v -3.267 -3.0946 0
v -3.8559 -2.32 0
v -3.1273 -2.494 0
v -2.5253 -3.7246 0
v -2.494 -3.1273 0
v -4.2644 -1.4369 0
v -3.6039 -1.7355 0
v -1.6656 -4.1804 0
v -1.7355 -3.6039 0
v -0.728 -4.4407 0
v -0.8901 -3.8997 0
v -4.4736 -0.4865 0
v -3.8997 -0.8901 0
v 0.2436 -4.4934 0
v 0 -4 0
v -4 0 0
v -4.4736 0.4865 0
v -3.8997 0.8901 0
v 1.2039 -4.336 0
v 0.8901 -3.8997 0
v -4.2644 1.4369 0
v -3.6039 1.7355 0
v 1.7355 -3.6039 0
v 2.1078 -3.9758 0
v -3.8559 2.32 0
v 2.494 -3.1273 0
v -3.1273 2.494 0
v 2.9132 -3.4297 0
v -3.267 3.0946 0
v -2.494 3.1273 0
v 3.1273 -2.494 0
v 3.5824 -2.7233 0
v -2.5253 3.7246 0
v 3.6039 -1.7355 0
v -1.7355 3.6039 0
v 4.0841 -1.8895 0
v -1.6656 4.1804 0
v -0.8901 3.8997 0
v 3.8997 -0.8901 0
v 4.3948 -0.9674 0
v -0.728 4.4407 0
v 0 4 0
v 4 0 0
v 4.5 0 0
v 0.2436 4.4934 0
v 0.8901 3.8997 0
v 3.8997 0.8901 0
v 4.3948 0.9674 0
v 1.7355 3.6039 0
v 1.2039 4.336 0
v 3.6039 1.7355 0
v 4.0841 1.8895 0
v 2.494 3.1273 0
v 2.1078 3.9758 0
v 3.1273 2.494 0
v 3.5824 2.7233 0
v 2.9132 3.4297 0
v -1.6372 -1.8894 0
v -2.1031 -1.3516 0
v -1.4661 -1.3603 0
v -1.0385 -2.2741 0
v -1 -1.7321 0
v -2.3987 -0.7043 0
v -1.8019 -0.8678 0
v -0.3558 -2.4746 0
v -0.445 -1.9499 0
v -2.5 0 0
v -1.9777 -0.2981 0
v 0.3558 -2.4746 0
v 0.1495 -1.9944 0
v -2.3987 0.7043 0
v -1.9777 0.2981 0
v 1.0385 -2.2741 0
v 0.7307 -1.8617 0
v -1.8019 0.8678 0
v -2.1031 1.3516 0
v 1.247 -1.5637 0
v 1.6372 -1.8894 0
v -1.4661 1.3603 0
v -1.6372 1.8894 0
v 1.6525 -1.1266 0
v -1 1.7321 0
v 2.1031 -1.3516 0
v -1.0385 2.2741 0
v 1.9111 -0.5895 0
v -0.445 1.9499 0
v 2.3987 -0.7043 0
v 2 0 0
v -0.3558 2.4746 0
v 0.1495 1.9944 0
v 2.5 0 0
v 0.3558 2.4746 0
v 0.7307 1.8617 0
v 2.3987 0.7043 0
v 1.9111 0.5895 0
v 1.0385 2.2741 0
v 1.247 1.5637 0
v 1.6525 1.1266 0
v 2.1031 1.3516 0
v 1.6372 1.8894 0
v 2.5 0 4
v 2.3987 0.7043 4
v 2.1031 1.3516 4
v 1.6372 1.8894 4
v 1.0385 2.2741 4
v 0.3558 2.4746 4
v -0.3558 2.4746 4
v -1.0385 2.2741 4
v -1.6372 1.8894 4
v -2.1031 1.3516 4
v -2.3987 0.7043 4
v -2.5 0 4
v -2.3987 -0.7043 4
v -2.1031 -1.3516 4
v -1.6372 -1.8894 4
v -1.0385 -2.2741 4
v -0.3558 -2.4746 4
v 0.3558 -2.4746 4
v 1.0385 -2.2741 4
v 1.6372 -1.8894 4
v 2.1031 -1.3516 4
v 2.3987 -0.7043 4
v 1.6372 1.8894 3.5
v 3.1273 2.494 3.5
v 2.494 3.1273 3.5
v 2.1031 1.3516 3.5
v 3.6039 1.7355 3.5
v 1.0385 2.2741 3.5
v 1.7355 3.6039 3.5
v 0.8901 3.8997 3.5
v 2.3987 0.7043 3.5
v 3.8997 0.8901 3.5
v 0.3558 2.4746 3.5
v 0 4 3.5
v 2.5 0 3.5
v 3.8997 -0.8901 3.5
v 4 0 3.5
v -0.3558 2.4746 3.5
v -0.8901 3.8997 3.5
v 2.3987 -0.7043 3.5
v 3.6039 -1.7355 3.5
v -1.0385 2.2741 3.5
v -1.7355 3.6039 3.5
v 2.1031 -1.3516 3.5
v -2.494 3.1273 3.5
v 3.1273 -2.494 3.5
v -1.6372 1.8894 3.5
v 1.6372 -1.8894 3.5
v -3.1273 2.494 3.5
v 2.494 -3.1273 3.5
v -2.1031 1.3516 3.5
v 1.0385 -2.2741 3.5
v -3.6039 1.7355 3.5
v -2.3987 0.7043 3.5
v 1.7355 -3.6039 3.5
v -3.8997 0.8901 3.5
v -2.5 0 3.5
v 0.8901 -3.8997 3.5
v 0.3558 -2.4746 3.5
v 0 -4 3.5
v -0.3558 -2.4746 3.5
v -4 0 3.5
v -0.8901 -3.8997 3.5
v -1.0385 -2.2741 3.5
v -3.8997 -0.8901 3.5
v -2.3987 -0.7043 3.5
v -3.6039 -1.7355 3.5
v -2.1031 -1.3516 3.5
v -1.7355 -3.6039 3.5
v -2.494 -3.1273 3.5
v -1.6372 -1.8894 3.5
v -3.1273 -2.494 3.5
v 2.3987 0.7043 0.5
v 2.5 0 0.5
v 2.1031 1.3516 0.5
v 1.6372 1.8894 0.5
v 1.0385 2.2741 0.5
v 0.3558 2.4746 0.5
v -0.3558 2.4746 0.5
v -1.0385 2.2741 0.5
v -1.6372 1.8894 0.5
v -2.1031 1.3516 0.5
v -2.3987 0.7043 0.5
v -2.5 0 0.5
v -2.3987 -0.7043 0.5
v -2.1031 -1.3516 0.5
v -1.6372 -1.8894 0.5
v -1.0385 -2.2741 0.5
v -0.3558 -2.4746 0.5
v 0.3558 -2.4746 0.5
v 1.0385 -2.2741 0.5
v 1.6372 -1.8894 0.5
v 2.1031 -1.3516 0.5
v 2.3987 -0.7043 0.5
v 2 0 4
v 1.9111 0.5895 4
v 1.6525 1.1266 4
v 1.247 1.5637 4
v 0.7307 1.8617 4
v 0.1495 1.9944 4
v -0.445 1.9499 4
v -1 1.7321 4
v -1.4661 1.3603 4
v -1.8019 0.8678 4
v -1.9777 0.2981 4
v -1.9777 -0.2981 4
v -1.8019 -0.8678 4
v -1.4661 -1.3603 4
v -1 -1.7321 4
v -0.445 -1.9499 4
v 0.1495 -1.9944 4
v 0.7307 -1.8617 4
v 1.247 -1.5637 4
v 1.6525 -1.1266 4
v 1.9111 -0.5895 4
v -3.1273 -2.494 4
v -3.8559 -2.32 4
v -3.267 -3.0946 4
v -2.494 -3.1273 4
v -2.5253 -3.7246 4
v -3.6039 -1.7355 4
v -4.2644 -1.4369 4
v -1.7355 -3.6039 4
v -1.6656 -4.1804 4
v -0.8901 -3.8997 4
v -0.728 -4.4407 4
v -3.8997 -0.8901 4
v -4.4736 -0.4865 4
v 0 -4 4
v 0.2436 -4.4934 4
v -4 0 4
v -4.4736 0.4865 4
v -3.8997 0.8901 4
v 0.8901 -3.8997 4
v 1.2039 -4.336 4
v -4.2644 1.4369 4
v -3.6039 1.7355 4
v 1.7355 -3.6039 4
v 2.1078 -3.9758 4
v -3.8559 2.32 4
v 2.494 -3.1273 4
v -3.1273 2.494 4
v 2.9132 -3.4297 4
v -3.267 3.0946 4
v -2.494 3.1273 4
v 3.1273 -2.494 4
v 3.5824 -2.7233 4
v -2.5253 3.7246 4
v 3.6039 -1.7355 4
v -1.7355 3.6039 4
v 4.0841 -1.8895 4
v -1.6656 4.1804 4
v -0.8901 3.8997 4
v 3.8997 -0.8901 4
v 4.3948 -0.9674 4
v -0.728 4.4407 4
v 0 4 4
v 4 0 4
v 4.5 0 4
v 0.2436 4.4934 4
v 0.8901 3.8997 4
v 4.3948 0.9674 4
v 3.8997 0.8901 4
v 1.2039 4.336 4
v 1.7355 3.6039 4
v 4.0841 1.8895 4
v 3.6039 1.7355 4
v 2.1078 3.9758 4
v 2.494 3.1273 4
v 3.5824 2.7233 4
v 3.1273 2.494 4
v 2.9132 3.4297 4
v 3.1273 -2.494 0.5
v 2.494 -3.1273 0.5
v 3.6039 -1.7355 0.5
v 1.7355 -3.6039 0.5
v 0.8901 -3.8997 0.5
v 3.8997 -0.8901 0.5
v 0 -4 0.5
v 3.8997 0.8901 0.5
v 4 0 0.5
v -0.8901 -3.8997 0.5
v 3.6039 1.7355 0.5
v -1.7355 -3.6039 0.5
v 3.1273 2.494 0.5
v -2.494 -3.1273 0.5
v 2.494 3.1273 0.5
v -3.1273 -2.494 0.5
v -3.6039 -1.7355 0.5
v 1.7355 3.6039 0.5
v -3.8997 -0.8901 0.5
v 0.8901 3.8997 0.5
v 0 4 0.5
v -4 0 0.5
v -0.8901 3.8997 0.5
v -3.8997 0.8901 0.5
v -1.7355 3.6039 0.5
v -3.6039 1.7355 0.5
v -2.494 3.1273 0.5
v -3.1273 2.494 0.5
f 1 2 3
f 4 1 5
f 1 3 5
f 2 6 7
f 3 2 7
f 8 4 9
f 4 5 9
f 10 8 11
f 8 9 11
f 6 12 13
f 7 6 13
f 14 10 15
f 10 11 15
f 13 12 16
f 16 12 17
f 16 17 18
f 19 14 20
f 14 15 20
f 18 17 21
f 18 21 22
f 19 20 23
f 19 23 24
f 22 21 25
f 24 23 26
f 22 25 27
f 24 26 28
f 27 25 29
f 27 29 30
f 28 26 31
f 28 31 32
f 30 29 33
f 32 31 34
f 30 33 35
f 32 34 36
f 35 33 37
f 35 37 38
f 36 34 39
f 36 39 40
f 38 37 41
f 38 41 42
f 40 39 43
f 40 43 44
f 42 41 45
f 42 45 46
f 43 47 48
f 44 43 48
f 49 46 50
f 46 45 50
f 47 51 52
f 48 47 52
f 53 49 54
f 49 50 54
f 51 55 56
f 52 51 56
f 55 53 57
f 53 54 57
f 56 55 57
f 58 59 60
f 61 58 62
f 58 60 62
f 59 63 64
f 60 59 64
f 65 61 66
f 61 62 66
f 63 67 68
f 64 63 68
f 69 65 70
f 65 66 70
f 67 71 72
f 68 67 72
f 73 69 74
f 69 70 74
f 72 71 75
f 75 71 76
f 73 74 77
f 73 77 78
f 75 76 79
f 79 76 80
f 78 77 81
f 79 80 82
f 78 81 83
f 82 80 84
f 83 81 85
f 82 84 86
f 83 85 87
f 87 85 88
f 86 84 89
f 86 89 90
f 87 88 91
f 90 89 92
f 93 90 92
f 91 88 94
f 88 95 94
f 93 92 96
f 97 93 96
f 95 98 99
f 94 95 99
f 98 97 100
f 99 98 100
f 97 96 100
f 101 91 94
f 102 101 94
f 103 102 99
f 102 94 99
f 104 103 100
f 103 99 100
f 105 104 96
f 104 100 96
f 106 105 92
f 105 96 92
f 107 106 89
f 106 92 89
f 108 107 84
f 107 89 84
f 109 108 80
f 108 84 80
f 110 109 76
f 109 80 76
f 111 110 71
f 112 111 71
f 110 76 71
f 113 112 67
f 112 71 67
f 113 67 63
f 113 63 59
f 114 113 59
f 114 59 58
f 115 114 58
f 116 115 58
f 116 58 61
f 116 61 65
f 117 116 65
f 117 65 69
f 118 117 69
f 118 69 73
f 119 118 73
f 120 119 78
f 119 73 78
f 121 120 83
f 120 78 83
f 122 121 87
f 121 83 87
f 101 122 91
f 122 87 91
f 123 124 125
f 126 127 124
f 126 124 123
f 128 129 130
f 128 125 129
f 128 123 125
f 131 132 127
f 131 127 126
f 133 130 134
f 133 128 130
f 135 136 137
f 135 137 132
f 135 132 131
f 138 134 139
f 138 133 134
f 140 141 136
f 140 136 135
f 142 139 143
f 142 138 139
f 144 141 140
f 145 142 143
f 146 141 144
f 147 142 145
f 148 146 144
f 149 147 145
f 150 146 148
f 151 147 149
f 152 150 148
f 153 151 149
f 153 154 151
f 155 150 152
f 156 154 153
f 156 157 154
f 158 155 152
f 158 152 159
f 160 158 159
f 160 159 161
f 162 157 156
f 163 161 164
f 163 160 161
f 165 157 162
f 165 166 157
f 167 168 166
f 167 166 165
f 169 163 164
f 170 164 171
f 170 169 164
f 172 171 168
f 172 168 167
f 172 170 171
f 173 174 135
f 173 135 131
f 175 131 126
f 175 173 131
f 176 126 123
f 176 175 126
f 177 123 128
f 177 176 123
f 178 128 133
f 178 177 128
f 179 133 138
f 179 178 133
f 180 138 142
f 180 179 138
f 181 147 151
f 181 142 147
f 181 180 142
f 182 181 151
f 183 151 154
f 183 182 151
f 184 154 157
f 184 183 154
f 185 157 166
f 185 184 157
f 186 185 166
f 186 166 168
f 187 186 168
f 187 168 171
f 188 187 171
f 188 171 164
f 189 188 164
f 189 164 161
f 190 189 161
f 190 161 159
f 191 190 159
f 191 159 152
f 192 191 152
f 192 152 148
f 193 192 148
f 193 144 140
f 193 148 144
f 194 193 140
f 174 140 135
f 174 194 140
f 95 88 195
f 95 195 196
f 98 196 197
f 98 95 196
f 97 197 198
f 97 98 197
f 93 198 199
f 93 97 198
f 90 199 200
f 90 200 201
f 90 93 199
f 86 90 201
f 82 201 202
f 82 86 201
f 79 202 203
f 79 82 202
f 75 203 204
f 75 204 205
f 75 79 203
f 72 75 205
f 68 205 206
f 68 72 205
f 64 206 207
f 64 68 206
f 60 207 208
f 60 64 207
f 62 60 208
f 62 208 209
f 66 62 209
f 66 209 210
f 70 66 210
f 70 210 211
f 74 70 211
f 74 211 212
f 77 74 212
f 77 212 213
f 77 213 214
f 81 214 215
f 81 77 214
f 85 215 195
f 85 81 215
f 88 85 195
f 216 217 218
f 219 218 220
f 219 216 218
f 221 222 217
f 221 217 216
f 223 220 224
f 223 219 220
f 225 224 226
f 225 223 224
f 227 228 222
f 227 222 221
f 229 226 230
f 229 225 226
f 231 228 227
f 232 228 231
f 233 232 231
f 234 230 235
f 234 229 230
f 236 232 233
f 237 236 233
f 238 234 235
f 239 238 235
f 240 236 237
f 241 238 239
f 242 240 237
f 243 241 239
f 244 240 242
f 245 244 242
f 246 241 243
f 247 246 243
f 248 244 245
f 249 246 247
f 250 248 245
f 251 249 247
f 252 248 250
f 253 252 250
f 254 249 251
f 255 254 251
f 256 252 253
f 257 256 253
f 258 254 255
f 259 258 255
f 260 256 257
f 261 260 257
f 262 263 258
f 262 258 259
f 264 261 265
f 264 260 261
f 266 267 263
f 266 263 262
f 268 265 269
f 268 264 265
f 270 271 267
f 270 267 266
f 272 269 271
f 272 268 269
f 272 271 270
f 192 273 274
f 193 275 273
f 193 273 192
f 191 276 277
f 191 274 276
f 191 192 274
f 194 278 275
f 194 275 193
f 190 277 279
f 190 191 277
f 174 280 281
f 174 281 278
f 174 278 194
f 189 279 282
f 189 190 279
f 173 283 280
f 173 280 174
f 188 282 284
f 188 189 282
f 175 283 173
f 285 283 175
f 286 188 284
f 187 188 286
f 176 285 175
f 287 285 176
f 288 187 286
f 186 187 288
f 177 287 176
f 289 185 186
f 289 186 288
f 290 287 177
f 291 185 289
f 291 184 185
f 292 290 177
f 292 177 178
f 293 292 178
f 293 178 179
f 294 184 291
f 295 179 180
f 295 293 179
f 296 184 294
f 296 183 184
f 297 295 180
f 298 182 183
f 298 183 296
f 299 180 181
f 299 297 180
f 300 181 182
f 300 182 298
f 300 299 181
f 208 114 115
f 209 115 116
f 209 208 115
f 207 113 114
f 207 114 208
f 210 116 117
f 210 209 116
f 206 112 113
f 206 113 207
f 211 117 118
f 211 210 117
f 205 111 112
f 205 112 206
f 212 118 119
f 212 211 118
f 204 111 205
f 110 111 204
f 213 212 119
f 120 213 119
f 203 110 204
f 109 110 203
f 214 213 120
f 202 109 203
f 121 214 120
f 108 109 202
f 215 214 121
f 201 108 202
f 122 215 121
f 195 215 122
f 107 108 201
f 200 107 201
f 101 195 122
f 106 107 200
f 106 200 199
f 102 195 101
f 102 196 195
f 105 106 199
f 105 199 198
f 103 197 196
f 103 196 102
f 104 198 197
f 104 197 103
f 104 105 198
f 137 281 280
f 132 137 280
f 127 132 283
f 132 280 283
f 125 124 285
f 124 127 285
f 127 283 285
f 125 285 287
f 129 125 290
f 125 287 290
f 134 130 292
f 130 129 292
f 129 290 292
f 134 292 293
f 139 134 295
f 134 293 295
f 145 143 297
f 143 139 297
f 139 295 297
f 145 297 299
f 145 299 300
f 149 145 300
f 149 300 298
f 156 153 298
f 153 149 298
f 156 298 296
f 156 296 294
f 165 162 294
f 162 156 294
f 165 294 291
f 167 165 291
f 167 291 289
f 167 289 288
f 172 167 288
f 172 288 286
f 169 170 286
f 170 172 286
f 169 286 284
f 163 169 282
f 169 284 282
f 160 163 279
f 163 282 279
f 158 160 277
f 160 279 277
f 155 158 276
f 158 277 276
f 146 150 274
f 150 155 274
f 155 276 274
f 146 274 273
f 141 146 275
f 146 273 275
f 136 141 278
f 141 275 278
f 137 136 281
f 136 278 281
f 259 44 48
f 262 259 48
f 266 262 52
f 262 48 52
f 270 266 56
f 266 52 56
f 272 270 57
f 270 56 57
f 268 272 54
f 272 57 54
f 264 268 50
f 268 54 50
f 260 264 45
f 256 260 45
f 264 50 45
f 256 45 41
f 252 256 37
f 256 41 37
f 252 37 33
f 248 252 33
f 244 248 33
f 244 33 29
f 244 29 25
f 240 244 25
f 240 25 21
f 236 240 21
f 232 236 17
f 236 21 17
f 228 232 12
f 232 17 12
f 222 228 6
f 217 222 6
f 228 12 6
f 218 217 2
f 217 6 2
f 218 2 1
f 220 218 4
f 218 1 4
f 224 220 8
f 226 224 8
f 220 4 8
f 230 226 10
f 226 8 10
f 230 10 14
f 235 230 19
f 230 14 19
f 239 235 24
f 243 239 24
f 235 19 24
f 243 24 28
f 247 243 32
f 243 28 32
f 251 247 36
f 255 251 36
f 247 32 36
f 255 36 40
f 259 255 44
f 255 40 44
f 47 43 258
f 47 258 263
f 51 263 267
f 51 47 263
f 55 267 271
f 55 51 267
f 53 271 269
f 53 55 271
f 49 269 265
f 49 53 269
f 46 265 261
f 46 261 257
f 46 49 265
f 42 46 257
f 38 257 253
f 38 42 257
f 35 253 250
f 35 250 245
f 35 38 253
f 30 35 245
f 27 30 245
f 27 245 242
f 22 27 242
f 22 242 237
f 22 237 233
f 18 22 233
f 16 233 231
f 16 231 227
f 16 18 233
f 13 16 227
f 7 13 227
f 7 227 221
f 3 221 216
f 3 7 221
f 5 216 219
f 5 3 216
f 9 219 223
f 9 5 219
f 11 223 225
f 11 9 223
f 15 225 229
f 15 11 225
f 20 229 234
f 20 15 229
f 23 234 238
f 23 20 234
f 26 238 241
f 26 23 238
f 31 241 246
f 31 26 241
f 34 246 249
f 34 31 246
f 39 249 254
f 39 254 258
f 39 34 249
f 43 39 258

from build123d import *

# Parameters (mm, degrees)
SKETCH1_R             = 4.5
SKETCH1_R_2           = 4
BOSS_EXTRUDE1_DEPTH   = 4
SKETCH1_R_3           = 2.5
SKETCH1_R_4           = 2
BOSS_EXTRUDE1_2_DEPTH = 4
BOSS_EXTRUDE2_START   = -1.2e-05
SKETCH1_3_R           = 4
SKETCH1_3_R_2         = 2.5
BOSS_EXTRUDE2_DEPTH   = 4.000012
SKETCH2_R             = 4
SKETCH2_R_2           = 2.5
CUT_EXTRUDE3_DEPTH    = 0.5
CUT_EXTRUDE4_START    = -0.5
SKETCH3_R             = 4
SKETCH3_R_2           = 2.5
CUT_EXTRUDE4_DEPTH    = 0.5


with BuildPart() as part:
    # Sketch1 → Boss-Extrude1 (new body)
    with BuildSketch(Plane.XY):
        Circle(SKETCH1_R)
        Circle(SKETCH1_R_2, mode=Mode.SUBTRACT)
    extrude(amount=BOSS_EXTRUDE1_DEPTH)


with BuildPart() as body_2:
    # Sketch1 → Boss-Extrude1 2 (new body)
    with BuildSketch(Plane.XY):
        Circle(SKETCH1_R_3)
        Circle(SKETCH1_R_4, mode=Mode.SUBTRACT)
    extrude(amount=BOSS_EXTRUDE1_2_DEPTH)


with BuildPart() as body_3:
    # Sketch1<3> → Boss-Extrude2 (new body)
    with BuildSketch(Plane.XY.offset(BOSS_EXTRUDE2_START)):
        Circle(SKETCH1_3_R)
        Circle(SKETCH1_3_R_2, mode=Mode.SUBTRACT)
    extrude(amount=BOSS_EXTRUDE2_DEPTH)

    # Sketch2 → Cut-Extrude3 (cut)
    with BuildSketch(Plane(origin=(0, 0, -1.2e-05), x_dir=(-1, 0, 0), z_dir=(0, 0, -1))):
        Circle(SKETCH2_R)
        Circle(SKETCH2_R_2, mode=Mode.SUBTRACT)
    extrude(amount=-CUT_EXTRUDE3_DEPTH, mode=Mode.SUBTRACT)

    # Sketch3 → Cut-Extrude4 (cut)
    with BuildSketch(Plane.XY.offset(4).offset(CUT_EXTRUDE4_START)):
        with Locations(Location((0, 0, 0), (0, 0, 180))):
            Circle(SKETCH3_R)
        with Locations(Location((0, 0, 0), (0, 0, 180))):
            Circle(SKETCH3_R_2, mode=Mode.SUBTRACT)
    extrude(amount=CUT_EXTRUDE4_DEPTH, mode=Mode.SUBTRACT)


solid = Compound([part.part, body_2.part, body_3.part])
